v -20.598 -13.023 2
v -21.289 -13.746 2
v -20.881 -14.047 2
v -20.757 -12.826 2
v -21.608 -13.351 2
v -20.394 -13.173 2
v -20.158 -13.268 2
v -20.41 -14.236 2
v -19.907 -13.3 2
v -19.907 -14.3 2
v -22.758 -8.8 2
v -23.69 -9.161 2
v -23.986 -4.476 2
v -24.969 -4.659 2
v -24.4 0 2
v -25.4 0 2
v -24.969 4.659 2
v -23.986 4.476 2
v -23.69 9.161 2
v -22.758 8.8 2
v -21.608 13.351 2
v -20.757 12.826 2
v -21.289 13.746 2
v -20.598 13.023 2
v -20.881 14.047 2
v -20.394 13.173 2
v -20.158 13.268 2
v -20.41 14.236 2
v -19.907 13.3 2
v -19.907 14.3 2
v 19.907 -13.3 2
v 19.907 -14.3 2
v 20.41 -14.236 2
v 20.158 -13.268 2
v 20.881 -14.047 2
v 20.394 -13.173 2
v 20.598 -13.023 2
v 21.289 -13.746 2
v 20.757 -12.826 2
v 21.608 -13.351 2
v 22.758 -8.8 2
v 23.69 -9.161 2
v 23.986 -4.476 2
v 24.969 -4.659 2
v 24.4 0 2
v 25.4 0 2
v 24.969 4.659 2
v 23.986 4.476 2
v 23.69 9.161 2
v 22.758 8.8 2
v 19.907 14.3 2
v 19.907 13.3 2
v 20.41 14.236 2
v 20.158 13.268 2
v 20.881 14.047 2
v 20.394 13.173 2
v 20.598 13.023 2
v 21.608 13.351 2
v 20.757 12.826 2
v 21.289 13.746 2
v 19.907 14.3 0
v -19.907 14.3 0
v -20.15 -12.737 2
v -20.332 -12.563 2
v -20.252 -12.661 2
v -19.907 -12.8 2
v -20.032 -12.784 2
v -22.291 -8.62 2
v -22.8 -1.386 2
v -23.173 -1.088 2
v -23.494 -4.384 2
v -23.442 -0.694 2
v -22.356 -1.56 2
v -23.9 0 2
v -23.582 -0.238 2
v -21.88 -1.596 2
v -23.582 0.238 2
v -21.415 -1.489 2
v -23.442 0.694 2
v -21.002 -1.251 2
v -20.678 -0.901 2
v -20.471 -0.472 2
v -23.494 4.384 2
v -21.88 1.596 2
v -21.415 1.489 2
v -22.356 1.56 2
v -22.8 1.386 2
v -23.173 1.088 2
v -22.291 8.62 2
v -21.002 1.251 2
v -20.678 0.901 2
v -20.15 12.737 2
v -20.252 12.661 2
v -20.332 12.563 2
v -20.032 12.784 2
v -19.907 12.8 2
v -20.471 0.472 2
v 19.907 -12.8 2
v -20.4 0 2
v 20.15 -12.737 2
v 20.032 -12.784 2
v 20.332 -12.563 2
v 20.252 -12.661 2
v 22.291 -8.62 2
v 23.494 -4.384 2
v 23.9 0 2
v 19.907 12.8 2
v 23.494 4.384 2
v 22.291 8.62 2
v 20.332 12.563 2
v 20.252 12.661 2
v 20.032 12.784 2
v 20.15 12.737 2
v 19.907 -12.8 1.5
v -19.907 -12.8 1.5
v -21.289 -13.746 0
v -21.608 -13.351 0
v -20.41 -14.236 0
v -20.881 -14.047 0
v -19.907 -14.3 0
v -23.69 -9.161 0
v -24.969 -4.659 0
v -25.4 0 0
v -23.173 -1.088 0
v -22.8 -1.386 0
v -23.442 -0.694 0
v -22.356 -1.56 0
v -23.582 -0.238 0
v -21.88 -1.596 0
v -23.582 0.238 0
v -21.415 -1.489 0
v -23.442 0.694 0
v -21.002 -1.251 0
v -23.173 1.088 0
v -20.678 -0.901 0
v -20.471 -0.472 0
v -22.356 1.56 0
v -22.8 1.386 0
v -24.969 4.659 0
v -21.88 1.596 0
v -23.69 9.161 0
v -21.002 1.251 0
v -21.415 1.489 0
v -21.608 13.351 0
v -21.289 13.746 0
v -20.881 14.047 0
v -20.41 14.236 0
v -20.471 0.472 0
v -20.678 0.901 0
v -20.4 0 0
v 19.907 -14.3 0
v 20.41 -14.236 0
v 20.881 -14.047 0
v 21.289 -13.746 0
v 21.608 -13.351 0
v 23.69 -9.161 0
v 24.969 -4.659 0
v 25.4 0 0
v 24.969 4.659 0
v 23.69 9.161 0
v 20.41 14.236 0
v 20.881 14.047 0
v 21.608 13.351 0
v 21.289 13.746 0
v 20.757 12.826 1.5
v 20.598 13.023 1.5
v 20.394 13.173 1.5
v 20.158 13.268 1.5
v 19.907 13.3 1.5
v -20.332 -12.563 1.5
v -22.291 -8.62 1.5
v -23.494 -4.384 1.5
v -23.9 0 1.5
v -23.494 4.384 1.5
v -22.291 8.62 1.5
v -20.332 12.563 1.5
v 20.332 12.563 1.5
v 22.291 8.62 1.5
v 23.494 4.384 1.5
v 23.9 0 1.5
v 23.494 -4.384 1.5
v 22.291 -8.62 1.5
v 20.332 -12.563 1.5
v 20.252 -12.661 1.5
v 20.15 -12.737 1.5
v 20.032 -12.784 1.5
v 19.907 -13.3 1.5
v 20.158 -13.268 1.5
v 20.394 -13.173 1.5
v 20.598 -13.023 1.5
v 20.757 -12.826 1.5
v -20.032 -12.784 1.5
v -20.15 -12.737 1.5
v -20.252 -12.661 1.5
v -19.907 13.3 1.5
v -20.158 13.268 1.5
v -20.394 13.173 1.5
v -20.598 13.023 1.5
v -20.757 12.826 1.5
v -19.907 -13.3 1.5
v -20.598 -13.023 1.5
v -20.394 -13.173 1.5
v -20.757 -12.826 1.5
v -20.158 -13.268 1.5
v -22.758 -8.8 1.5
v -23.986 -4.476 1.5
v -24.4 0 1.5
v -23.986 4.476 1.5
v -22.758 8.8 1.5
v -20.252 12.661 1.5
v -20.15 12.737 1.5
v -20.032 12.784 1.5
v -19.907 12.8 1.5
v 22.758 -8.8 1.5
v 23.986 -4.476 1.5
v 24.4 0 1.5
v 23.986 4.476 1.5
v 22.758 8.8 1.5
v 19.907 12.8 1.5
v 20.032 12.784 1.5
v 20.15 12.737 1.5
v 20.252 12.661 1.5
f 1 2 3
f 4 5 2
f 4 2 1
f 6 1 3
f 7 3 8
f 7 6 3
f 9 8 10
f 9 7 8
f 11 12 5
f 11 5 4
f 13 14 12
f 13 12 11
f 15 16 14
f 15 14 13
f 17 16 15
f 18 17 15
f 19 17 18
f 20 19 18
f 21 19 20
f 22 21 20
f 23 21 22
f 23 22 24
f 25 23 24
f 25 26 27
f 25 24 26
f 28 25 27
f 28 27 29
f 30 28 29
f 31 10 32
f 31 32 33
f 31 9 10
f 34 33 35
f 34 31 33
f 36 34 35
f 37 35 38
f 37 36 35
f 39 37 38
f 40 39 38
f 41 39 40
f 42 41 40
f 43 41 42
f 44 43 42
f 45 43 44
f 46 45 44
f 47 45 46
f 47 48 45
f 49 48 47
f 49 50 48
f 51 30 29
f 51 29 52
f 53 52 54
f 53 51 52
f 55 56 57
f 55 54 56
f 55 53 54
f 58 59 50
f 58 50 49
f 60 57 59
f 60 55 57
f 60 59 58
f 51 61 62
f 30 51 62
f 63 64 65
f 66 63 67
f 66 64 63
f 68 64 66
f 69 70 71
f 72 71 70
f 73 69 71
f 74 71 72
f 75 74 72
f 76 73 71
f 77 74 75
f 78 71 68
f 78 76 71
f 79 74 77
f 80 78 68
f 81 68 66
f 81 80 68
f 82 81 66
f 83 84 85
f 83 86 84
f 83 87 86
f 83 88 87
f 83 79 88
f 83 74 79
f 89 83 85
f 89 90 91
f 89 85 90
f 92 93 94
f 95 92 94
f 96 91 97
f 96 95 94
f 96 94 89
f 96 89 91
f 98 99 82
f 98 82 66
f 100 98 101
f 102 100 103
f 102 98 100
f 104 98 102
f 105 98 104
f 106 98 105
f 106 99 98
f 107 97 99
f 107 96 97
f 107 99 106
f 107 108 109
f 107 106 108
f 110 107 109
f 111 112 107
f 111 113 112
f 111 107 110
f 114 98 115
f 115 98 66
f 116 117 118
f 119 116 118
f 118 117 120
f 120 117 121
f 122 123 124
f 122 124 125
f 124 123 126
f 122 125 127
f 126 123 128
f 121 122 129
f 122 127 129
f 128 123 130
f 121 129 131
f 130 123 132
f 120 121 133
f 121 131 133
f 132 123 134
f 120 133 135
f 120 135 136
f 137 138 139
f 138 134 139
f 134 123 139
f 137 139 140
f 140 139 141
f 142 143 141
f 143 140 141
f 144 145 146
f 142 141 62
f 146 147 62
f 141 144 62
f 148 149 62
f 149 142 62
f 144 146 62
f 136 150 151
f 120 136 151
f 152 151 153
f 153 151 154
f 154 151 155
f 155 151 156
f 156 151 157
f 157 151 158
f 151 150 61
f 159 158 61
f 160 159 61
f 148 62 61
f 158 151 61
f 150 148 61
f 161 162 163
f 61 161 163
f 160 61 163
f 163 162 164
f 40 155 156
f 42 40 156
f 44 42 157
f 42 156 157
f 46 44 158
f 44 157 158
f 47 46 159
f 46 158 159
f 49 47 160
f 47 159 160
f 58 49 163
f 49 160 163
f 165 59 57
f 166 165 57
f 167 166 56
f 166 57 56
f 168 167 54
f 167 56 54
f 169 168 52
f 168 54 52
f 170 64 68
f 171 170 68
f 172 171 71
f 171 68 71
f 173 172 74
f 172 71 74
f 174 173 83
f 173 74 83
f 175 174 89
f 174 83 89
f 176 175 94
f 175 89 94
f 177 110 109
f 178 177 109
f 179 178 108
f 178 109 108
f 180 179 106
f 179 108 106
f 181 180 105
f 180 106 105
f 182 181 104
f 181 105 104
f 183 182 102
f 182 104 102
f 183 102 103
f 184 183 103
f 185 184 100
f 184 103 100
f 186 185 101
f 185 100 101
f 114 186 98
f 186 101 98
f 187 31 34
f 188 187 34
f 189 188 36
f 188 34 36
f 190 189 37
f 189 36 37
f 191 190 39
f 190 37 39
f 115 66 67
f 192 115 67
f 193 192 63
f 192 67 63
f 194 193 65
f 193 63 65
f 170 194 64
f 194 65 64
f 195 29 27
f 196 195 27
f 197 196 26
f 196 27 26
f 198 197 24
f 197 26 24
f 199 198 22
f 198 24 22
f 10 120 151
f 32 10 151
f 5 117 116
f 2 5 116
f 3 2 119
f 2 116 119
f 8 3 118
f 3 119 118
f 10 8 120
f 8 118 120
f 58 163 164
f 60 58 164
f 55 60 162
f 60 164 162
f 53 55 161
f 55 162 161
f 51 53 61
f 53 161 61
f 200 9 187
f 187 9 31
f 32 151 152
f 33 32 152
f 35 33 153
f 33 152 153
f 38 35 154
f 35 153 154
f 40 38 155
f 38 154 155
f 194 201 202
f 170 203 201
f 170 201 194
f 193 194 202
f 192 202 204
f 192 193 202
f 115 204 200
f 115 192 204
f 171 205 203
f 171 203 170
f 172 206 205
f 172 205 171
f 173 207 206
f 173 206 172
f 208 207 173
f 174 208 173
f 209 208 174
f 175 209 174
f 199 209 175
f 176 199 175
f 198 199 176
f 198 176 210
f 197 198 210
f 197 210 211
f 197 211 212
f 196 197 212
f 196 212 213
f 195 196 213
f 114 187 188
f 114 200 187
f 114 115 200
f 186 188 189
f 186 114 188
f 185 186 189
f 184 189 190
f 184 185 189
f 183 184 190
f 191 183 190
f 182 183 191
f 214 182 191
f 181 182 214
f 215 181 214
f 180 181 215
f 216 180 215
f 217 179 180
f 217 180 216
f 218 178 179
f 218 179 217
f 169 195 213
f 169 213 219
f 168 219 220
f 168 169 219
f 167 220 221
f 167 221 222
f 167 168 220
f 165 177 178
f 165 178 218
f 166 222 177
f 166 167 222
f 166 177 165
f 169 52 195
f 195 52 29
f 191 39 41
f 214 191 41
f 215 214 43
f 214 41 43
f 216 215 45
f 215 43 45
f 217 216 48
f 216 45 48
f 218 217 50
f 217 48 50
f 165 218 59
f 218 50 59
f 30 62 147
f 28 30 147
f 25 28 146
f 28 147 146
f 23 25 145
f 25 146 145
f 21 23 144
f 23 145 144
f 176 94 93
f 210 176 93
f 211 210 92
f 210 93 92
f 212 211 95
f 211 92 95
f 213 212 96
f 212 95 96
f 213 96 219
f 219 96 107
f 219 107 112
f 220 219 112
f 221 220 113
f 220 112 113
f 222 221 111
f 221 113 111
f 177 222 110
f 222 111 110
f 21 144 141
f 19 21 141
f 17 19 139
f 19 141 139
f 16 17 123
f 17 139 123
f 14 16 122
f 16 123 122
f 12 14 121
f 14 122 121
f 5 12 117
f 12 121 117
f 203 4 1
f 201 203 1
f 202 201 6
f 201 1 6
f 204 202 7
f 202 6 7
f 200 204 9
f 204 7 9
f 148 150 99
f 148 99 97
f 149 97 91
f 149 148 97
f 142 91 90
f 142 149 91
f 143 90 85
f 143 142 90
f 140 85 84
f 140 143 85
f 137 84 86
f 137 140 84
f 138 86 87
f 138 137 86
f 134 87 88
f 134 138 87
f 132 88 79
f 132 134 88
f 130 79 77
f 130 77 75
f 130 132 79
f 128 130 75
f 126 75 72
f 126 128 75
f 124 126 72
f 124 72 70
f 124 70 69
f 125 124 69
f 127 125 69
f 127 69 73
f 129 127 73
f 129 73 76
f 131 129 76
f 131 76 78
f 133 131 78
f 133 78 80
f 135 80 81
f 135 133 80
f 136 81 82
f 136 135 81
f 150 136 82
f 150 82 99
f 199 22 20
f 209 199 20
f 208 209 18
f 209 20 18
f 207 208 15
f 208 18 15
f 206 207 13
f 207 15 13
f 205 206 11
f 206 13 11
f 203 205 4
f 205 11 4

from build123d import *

# Parameters (mm, degrees)
F0_R     = 1.6
F1_DEPTH = 2
F3_DEPTH = 0.5


with BuildPart() as f1:
    # F0 (on Top) → F1 (new body)
    with BuildSketch(Plane.XY):
        with BuildLine():
            Line((-19.906532, -14.3), (19.906532, -14.3))
            ThreePointArc((19.906532, -14.3), (20.880553, -14.046792), (21.607945, -13.351282))
            ThreePointArc((21.607945, -13.351282), (25.4, 0), (21.607945, 13.351282))
            ThreePointArc((21.607945, 13.351282), (20.880553, 14.046792), (19.906532, 14.3))
            Line((19.906532, 14.3), (-19.906532, 14.3))
            ThreePointArc((-19.906532, 14.3), (-20.880553, 14.046792), (-21.607945, 13.351282))
            ThreePointArc((-21.607945, 13.351282), (-25.4, 0), (-21.607945, -13.351282))
            ThreePointArc((-21.607945, -13.351282), (-20.880553, -14.046792), (-19.906532, -14.3))
        make_face()
        with Locations((-22, 0)):
            Circle(F0_R, mode=Mode.SUBTRACT)
    extrude(amount=F1_DEPTH)

    # F2 (on face) → F3 (cut)
    with BuildSketch(Plane.XY.offset(2)):
        with BuildLine():
            ThreePointArc((19.906532, -13.3), (20.393542, -13.173396), (20.757238, -12.825641))
            ThreePointArc((20.757238, -12.825641), (24.4, 0), (20.757238, 12.825641))
            ThreePointArc((20.757238, 12.825641), (20.393542, 13.173396), (19.906532, 13.3))
            Line((19.906532, 13.3), (-19.906532, 13.3))
            ThreePointArc((-19.906532, 13.3), (-20.393542, 13.173396), (-20.757238, 12.825641))
            ThreePointArc((-20.757238, 12.825641), (-24.4, 0), (-20.757238, -12.825641))
            ThreePointArc((-20.757238, -12.825641), (-20.393542, -13.173396), (-19.906532, -13.3))
            Line((-19.906532, -13.3), (19.906532, -13.3))
        make_face()
        with BuildLine():
            ThreePointArc((20.331885, 12.562821), (23.9, 0), (20.331885, -12.562821))
            ThreePointArc((20.331885, -12.562821), (20.150037, -12.736698), (19.906532, -12.8))
            Line((19.906532, -12.8), (-19.906532, -12.8))
            ThreePointArc((-19.906532, -12.8), (-20.150037, -12.736698), (-20.331885, -12.562821))
            ThreePointArc((-20.331885, -12.562821), (-23.9, 0), (-20.331885, 12.562821))
            ThreePointArc((-20.331885, 12.562821), (-20.150037, 12.736698), (-19.906532, 12.8))
            Line((-19.906532, 12.8), (19.906532, 12.8))
            ThreePointArc((19.906532, 12.8), (20.150037, 12.736698), (20.331885, 12.562821))
        make_face(mode=Mode.SUBTRACT)
    extrude(amount=-F3_DEPTH, mode=Mode.SUBTRACT)


solid = f1.part
